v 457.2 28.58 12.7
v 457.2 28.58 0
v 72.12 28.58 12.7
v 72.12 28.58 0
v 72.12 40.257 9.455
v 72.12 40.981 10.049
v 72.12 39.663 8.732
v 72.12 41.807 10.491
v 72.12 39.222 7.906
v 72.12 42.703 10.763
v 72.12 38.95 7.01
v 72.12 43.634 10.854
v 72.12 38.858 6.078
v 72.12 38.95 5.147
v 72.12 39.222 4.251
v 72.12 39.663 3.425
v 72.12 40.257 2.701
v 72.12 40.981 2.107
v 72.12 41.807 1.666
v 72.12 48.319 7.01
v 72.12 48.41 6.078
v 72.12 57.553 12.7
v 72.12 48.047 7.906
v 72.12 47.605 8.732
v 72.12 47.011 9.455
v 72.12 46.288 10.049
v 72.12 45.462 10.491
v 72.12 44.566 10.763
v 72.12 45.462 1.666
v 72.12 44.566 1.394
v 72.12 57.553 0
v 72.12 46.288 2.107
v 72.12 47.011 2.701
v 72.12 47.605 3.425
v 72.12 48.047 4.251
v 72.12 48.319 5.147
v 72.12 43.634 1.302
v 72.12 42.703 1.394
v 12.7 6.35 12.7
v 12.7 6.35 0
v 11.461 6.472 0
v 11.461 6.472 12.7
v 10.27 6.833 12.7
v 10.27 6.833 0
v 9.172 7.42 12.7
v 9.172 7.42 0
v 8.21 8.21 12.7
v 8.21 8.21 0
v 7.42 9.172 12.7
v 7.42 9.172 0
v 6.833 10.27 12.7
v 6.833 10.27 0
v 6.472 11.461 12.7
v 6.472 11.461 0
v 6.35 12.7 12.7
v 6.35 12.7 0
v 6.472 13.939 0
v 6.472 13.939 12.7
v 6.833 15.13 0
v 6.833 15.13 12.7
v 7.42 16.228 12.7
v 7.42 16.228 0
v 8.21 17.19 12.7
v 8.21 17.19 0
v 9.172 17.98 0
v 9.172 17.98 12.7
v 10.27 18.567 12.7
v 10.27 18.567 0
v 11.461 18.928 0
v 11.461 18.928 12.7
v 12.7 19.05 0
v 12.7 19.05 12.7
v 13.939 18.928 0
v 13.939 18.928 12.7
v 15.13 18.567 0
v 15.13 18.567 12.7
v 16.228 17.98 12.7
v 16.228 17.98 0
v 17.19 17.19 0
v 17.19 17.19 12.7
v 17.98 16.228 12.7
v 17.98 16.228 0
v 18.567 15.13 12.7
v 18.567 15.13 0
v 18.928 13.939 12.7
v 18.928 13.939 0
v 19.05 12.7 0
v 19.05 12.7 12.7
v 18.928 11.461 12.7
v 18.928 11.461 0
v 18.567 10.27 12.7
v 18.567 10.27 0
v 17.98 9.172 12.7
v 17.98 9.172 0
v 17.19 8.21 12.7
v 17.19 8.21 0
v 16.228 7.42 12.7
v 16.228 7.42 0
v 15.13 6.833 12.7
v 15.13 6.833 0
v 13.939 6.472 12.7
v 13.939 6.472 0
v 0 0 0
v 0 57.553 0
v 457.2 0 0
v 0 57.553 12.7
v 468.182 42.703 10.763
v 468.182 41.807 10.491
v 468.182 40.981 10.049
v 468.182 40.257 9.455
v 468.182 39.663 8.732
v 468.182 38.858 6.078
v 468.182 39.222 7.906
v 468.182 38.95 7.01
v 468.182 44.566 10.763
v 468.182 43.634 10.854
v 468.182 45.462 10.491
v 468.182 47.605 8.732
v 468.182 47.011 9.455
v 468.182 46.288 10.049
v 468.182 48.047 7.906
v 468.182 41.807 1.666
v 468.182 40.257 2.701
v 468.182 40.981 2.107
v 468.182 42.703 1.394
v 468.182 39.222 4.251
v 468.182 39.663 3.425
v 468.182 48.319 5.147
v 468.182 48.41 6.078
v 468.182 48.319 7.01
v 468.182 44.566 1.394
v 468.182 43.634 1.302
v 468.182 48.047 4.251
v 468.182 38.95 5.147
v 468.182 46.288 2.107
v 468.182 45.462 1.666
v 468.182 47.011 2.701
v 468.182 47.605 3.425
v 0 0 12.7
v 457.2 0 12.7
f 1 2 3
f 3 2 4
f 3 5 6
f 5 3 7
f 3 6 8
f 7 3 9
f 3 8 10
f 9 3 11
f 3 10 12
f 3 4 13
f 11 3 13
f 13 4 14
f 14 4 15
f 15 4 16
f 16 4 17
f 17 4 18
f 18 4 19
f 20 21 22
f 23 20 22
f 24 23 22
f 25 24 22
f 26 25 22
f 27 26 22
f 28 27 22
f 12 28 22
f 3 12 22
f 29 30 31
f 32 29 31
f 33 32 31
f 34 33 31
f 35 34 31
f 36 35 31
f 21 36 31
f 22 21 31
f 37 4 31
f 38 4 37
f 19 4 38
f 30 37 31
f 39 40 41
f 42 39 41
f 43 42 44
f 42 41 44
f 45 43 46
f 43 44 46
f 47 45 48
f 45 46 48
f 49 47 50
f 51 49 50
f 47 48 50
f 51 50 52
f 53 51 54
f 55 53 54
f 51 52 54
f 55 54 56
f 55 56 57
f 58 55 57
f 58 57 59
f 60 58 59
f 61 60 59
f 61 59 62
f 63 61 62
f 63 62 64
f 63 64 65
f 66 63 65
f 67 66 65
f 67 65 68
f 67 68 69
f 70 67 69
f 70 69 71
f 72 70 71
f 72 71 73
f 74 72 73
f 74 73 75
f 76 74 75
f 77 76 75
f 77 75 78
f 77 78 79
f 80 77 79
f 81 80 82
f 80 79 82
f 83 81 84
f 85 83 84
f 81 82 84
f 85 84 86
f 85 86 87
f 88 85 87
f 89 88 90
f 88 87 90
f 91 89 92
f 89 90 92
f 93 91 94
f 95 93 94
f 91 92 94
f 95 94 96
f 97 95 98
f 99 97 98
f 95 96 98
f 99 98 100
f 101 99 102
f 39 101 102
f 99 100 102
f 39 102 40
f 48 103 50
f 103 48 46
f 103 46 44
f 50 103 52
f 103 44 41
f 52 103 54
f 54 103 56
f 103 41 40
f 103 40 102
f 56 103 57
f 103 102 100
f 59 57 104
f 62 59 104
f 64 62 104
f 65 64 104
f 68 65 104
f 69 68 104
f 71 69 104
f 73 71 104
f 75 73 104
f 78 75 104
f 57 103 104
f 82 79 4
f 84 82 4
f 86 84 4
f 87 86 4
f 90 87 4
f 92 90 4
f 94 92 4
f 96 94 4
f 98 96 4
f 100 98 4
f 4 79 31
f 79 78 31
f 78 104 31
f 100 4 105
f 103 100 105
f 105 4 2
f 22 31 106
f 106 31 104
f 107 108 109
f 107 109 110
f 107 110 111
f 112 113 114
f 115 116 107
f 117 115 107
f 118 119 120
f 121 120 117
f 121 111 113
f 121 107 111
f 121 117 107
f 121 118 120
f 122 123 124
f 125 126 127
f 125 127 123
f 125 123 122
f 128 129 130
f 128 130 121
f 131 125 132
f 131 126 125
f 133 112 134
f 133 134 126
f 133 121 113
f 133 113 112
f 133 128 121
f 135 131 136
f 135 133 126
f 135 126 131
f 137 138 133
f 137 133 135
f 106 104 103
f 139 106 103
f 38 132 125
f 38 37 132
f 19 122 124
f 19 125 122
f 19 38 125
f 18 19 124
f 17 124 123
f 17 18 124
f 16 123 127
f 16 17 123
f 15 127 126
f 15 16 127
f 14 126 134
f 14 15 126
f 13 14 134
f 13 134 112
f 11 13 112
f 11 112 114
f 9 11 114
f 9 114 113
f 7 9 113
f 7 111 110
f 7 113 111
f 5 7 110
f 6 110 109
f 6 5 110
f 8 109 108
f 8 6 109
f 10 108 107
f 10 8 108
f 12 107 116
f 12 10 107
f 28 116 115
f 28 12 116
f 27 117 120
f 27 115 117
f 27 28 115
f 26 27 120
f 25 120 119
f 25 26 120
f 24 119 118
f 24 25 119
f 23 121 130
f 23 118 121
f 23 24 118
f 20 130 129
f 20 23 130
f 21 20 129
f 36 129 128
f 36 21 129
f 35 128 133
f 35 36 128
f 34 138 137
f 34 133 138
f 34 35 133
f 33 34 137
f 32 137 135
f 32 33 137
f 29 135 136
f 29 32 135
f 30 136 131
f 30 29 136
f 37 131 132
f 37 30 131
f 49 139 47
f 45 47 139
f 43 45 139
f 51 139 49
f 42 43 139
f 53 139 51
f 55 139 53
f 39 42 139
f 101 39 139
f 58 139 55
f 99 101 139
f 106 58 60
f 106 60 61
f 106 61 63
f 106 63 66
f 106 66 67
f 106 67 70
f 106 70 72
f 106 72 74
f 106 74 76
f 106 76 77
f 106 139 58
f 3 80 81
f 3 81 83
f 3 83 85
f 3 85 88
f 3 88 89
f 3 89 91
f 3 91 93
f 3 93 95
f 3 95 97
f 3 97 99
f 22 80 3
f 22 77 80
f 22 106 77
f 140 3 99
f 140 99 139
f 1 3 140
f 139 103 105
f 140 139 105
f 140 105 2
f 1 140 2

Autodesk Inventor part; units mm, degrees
ref_plane "YZ Plane" through (0, 0, 0) normal (1, 0, 0) x (0, 1, 0)
ref_plane "XZ Plane" through (0, 0, 0) normal (0, 1, 0) x (-1, 0, 0)
ref_plane "XY Plane" through (0, 0, 0) normal (0, 0, 1) x (1, 0, 0)
sketch "Sketch1" plane through (0, 0, 0) normal (0, 0, 1) x (1, 0, 0)
  line L0 (0, 0) -> (457.2, 0)
  line L1 (457.2, 0) -> (457.2, 28.58)
  line L2 (457.2, 28.58) -> (72.12, 28.58)
  line L3 (0, 28.58) -> (0, 0)
  line L4 (0, 8.7151) -> (0, 28.58)
  line L5 (72.12, 28.58) -> (72.12, 57.5527)
  line L6 (72.12, 57.5527) -> (0, 57.5527)
  line L7 (0, 57.5527) -> (0, 28.58)
  dimension "d0" = 457.2
  dimension "d2" = 28.58
  dimension "d4" = 72.12
extrude "Extrusion1" add sketch "Sketch1" along normal blind 12.7
sketch "Sketch2" plane through (72.12, 28.58, 0) normal (1, 0, 0) x (0, 0, -1)
  circle A0 centre (-6.0784, 15.0544) radius 4.7759
  line L0 (0, 28.9727) -> (-12.7, 28.9727) projected
  line L1 (-12.7, 0) -> (-12.7, 28.9727) projected
  point P0 (0, -28.58)
extrude "Extrusion2" add sketch "Sketch2" along normal blind 396.0622
sketch "Sketch3" plane through (72.12, 28.58, 0) normal (0, 1, 0) x (1, 0, 0)
  point P0 (-72.12, 0)
sketch "Sketch4" plane through (0, 0, 12.7) normal (0, 0, 1) x (1, 0, 0)
  circle A0 centre (12.7, 12.7) radius 6.35
  line L0 (0, 0) -> (457.2, 0) projected
  line L1 (0, 57.5527) -> (0, 0) projected
  dimension "d12" = 12.7
  dimension "d13" = 12.7
  dimension "d14" = 12.7
hole "Hole1" at (12.7, 12.7, 12.7) direction (0, 0, -1) diameter 12.7 end through all
equation "\"d20\" = Thickness"
equation "\"BendRadius\" = Thickness"
equation "\"BendReliefWidth\" = Thickness"
equation "\"BendReliefDepth\" = 0.5 * Thickness"
equation "\"CornerReliefSize\" = 4 * Thickness"
equation "\"MinimumRemnant\" = 2 * Thickness"
equation "\"TransitionRadius\" = BendRadius"
equation "\"JacobiRadiusSize\" = BendRadius"
equation "\"GapSize\" = Thickness"
equation "\"Thickness\" = 3.048"
properties part number "new bolt"
